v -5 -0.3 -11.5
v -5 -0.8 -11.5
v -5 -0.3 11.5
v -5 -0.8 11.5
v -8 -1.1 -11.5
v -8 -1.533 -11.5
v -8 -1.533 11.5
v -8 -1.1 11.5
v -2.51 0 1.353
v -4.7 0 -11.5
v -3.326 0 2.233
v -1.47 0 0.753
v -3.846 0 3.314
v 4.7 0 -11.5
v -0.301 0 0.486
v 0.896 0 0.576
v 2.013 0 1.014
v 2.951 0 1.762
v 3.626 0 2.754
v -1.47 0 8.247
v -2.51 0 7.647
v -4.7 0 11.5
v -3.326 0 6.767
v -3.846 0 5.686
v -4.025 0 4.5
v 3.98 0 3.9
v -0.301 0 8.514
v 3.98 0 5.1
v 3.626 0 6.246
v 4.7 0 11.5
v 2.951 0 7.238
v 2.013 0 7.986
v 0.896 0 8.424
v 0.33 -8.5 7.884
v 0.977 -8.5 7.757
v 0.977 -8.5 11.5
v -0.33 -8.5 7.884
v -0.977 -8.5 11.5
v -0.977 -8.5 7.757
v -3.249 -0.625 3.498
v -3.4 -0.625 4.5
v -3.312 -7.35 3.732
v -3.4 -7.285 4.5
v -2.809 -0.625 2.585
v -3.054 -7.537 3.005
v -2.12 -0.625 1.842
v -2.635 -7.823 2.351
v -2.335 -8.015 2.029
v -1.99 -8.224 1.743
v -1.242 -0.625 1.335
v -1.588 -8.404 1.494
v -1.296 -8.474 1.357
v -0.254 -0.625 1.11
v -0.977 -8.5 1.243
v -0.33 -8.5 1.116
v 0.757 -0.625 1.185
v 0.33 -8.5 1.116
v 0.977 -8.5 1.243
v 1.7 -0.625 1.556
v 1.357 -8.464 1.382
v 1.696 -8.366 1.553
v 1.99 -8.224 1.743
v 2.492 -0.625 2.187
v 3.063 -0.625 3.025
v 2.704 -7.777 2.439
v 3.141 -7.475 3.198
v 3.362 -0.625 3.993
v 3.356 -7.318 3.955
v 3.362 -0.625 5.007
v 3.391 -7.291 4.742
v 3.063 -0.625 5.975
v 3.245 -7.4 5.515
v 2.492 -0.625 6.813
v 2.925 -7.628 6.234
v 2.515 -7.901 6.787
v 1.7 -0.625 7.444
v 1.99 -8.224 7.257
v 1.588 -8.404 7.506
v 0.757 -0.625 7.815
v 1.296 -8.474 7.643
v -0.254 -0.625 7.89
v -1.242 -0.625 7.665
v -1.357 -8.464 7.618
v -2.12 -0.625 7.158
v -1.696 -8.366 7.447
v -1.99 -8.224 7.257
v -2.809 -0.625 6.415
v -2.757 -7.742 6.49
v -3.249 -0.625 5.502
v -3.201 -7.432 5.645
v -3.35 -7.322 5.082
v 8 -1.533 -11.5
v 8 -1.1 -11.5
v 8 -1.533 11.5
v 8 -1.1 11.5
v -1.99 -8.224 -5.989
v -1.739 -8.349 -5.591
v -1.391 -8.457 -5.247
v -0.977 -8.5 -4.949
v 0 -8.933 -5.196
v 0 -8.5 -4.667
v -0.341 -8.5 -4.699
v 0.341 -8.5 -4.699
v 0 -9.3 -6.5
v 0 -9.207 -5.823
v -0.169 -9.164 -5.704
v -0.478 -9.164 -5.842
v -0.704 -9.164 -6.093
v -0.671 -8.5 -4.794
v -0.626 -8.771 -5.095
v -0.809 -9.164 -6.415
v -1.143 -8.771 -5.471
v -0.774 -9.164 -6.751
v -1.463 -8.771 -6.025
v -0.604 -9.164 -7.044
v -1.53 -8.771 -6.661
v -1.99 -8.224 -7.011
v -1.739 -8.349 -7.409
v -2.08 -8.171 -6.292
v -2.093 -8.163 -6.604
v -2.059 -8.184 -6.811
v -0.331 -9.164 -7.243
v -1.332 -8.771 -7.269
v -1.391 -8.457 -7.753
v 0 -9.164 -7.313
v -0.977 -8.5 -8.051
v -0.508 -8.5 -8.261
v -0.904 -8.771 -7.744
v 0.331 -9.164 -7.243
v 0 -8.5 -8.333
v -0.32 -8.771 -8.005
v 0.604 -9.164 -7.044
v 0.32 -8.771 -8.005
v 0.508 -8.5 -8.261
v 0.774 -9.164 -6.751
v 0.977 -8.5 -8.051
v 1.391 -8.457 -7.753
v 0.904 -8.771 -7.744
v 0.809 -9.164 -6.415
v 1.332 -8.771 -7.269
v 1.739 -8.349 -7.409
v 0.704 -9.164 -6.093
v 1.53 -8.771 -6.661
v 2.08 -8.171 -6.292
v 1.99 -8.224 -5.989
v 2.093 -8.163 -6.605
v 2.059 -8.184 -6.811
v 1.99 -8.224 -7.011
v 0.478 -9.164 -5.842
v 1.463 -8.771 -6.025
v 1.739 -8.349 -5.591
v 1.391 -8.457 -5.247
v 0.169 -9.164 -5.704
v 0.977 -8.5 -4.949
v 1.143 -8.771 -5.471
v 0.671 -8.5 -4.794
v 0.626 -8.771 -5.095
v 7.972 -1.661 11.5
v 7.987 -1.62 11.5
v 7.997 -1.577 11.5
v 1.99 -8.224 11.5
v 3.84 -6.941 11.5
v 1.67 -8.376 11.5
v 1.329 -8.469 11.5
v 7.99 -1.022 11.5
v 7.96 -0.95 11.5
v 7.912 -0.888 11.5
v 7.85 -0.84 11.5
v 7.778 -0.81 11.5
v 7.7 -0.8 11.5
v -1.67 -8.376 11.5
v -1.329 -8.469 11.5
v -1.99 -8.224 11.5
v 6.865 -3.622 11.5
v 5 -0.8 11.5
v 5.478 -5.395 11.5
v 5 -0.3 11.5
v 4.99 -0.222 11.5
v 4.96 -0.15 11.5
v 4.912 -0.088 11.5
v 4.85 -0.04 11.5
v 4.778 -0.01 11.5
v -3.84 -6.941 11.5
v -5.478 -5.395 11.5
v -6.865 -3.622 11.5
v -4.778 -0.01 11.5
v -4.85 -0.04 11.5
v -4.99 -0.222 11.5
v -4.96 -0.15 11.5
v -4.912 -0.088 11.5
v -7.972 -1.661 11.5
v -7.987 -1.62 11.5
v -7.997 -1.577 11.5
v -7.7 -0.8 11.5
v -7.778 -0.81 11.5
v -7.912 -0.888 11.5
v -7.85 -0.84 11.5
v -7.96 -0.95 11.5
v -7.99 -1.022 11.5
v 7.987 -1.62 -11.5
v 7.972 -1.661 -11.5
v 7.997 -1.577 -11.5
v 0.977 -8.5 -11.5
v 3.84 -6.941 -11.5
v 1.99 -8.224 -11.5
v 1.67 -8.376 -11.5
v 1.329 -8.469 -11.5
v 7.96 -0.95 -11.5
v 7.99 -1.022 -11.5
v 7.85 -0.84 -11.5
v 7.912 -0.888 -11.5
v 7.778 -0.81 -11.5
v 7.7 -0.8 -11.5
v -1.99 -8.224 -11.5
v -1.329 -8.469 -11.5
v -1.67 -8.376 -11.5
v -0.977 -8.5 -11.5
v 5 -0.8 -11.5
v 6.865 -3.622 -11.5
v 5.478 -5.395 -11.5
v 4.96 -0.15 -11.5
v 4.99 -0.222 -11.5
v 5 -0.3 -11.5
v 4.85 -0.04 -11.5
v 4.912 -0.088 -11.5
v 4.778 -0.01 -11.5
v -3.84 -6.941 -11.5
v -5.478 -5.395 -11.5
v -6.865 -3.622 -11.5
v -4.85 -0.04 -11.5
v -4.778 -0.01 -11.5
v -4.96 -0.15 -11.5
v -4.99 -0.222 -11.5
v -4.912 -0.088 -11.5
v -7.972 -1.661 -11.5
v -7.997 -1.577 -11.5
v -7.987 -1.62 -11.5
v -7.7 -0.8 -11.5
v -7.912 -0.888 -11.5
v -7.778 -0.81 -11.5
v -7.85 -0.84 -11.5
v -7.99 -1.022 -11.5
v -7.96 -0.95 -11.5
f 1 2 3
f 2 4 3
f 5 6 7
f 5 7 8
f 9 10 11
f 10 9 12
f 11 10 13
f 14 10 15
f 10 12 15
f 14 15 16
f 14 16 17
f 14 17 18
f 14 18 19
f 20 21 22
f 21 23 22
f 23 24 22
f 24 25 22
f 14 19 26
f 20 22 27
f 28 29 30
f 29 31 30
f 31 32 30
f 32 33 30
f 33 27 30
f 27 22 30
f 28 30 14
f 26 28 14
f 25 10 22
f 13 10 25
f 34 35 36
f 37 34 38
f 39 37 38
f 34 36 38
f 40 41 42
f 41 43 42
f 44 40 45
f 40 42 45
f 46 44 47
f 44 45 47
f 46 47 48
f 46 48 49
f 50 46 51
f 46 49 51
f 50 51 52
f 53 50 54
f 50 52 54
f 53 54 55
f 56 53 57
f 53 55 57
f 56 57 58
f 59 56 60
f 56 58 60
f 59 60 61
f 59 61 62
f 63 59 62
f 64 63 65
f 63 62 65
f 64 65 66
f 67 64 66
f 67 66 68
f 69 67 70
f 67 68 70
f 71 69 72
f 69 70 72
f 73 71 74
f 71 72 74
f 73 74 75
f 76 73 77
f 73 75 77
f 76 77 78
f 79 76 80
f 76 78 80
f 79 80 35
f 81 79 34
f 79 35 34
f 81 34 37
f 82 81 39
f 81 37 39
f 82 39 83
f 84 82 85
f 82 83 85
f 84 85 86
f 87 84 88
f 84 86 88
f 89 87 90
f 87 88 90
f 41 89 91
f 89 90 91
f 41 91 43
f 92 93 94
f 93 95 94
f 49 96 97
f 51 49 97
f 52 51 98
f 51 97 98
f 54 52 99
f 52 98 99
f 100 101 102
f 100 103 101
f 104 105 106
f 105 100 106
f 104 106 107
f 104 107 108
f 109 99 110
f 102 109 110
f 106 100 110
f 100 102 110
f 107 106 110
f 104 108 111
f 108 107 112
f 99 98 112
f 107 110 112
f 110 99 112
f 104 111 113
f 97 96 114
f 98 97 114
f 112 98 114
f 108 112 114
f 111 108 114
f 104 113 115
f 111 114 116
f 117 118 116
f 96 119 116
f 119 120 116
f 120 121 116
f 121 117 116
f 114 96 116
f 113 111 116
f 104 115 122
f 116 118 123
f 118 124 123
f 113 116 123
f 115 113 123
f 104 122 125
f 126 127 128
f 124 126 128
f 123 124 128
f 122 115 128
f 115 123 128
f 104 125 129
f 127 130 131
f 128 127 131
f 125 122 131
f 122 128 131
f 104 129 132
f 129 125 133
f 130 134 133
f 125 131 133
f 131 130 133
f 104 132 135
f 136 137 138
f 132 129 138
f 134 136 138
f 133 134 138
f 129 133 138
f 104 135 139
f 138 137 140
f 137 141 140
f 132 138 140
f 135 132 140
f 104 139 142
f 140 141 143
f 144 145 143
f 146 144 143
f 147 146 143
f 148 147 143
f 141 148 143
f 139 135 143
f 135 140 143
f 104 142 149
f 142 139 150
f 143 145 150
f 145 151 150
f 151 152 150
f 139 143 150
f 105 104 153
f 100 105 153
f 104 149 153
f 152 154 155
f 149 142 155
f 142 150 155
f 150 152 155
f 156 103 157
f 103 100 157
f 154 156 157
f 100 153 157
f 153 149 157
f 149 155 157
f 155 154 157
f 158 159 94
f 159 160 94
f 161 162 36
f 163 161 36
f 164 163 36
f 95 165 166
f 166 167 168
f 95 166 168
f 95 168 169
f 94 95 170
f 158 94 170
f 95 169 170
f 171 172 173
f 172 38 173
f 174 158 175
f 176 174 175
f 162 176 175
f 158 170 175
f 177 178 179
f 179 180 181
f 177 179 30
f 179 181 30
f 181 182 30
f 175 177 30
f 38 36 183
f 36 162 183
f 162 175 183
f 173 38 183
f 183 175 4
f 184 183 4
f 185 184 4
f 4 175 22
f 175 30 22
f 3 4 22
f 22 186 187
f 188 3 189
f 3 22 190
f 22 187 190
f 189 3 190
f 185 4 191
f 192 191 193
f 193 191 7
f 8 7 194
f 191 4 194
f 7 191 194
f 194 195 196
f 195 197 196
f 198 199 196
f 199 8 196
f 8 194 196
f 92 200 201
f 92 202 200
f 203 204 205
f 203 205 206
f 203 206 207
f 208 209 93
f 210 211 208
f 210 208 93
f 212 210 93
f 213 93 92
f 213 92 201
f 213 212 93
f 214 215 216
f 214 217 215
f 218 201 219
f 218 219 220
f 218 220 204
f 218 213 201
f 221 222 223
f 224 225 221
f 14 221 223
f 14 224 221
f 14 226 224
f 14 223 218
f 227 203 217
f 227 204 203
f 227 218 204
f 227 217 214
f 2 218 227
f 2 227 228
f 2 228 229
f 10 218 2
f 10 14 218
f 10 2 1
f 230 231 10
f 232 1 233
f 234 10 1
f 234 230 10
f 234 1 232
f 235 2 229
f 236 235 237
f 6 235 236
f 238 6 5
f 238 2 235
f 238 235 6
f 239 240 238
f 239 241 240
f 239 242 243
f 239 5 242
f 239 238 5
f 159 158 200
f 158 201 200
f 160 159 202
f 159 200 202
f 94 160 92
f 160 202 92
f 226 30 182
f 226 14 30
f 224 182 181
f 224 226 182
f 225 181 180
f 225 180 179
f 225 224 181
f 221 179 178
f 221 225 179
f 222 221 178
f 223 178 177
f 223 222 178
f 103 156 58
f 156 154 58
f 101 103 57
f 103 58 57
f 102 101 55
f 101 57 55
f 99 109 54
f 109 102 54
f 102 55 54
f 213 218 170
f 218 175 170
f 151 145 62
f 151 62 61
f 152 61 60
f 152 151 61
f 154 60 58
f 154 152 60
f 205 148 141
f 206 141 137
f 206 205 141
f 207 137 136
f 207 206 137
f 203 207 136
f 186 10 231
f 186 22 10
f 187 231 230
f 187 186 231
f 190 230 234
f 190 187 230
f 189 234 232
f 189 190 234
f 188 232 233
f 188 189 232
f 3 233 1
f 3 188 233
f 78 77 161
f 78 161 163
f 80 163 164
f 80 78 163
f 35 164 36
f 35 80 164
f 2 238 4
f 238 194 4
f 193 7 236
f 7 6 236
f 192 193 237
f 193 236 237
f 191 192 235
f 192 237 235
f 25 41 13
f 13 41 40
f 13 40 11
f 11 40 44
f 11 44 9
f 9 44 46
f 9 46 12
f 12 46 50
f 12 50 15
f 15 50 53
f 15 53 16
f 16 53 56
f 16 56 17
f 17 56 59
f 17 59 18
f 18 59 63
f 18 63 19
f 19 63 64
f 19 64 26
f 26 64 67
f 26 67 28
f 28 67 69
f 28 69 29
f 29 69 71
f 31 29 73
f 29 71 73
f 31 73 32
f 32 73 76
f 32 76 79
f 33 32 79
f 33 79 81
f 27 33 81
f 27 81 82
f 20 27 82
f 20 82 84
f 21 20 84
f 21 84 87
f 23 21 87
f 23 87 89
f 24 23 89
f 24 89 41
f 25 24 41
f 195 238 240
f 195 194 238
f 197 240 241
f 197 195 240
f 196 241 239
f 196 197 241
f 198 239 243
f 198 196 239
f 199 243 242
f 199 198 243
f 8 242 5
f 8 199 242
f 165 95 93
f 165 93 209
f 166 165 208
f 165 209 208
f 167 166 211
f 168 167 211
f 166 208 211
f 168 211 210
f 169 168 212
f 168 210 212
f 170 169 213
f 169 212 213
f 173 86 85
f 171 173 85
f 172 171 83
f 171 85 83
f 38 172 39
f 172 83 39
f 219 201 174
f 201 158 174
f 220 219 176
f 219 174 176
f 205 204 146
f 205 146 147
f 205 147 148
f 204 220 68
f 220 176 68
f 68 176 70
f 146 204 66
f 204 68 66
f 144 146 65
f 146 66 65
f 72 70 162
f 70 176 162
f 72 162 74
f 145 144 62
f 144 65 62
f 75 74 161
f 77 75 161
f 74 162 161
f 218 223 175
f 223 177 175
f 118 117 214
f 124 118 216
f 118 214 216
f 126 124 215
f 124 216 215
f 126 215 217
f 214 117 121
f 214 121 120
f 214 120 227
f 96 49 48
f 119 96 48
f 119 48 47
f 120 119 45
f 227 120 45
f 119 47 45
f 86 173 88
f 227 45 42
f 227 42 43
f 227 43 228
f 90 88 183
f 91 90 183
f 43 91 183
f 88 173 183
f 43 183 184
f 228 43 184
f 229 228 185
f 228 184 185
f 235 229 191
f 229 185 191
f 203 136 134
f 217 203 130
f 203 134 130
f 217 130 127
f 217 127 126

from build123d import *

# Parameters (mm, degrees)
EXTRUDE_1_DEPTH             = 11.5
FILLET_1_R                  = 0.3
FILLET_2_R                  = 2
HOLE_WIZARD_M83_D           = 6.8
HOLE_WIZARD_M83_CSINK_D     = 8.05
HOLE_WIZARD_M83_CSINK_ANGLE = 90


with BuildPart() as part:
    # Эскиз1 → Бобышка-Вытянуть1 (new body, symmetric)
    with BuildSketch(Plane.XY):
        with BuildLine():
            Line((-5, 0), (5, 0))
            Line((5, 0), (5, -0.8))
            Line((5, -0.8), (8, -0.8))
            Line((8, -0.8), (8, -1.6))
            ThreePointArc((8, -1.6), (5.309398779, -5.576969864), (1.5, -8.5))
            Line((1.5, -8.5), (-1.5, -8.5))
            ThreePointArc((-1.5, -8.5), (-5.309398779, -5.576969864), (-8, -1.6))
            Line((-8, -1.6), (-8, -0.8))
            Line((-8, -0.8), (-5, -0.8))
            Line((-5, -0.8), (-5, 0))
        make_face()
    extrude(amount=EXTRUDE_1_DEPTH, both=True)

    # Скругление1
    fillet_1_edges = [part.edges().sort_by_distance(p)[0] for p in [
        (8, -0.8, 0),
        (8, -1.6, 0),
        (-8, -1.6, 0),
        (-8, -0.8, 0),
        (-5, 0, 0),
        (5, 0, 0),
    ]]
    fillet(fillet_1_edges, radius=FILLET_1_R)

    # Скругление2
    fillet_2_edges = [part.edges().sort_by_distance(p)[0] for p in [
        (1.5, -8.5, 0),
        (-1.5, -8.5, 0),
    ]]
    fillet(fillet_2_edges, radius=FILLET_2_R)

    # Отверстие обработанное метчиком M83 (through all)
    with Locations(Plane(origin=(0, 0, 0), x_dir=(1, 0, 0), z_dir=(0, 1, 0))):
        with Locations((0, -4.5)):
            CounterSinkHole(HOLE_WIZARD_M83_D / 2, HOLE_WIZARD_M83_CSINK_D / 2, counter_sink_angle=HOLE_WIZARD_M83_CSINK_ANGLE)

    # Эскиз5 → Повернуть1 (revolve)
    with BuildSketch(Plane(origin=(0, 0, 0), x_dir=(0, 0, -1), z_dir=(1, 0, 0))):
        with BuildLine():
            Line((6.5, -4.3), (6.5, -9.3))
            ThreePointArc((6.5, -9.3), (4, -6.8), (6.5, -4.3))
        make_face()
    revolve(axis=Axis((0, -4.3, -6.5), (0, -1, 0)))


solid = part.part
